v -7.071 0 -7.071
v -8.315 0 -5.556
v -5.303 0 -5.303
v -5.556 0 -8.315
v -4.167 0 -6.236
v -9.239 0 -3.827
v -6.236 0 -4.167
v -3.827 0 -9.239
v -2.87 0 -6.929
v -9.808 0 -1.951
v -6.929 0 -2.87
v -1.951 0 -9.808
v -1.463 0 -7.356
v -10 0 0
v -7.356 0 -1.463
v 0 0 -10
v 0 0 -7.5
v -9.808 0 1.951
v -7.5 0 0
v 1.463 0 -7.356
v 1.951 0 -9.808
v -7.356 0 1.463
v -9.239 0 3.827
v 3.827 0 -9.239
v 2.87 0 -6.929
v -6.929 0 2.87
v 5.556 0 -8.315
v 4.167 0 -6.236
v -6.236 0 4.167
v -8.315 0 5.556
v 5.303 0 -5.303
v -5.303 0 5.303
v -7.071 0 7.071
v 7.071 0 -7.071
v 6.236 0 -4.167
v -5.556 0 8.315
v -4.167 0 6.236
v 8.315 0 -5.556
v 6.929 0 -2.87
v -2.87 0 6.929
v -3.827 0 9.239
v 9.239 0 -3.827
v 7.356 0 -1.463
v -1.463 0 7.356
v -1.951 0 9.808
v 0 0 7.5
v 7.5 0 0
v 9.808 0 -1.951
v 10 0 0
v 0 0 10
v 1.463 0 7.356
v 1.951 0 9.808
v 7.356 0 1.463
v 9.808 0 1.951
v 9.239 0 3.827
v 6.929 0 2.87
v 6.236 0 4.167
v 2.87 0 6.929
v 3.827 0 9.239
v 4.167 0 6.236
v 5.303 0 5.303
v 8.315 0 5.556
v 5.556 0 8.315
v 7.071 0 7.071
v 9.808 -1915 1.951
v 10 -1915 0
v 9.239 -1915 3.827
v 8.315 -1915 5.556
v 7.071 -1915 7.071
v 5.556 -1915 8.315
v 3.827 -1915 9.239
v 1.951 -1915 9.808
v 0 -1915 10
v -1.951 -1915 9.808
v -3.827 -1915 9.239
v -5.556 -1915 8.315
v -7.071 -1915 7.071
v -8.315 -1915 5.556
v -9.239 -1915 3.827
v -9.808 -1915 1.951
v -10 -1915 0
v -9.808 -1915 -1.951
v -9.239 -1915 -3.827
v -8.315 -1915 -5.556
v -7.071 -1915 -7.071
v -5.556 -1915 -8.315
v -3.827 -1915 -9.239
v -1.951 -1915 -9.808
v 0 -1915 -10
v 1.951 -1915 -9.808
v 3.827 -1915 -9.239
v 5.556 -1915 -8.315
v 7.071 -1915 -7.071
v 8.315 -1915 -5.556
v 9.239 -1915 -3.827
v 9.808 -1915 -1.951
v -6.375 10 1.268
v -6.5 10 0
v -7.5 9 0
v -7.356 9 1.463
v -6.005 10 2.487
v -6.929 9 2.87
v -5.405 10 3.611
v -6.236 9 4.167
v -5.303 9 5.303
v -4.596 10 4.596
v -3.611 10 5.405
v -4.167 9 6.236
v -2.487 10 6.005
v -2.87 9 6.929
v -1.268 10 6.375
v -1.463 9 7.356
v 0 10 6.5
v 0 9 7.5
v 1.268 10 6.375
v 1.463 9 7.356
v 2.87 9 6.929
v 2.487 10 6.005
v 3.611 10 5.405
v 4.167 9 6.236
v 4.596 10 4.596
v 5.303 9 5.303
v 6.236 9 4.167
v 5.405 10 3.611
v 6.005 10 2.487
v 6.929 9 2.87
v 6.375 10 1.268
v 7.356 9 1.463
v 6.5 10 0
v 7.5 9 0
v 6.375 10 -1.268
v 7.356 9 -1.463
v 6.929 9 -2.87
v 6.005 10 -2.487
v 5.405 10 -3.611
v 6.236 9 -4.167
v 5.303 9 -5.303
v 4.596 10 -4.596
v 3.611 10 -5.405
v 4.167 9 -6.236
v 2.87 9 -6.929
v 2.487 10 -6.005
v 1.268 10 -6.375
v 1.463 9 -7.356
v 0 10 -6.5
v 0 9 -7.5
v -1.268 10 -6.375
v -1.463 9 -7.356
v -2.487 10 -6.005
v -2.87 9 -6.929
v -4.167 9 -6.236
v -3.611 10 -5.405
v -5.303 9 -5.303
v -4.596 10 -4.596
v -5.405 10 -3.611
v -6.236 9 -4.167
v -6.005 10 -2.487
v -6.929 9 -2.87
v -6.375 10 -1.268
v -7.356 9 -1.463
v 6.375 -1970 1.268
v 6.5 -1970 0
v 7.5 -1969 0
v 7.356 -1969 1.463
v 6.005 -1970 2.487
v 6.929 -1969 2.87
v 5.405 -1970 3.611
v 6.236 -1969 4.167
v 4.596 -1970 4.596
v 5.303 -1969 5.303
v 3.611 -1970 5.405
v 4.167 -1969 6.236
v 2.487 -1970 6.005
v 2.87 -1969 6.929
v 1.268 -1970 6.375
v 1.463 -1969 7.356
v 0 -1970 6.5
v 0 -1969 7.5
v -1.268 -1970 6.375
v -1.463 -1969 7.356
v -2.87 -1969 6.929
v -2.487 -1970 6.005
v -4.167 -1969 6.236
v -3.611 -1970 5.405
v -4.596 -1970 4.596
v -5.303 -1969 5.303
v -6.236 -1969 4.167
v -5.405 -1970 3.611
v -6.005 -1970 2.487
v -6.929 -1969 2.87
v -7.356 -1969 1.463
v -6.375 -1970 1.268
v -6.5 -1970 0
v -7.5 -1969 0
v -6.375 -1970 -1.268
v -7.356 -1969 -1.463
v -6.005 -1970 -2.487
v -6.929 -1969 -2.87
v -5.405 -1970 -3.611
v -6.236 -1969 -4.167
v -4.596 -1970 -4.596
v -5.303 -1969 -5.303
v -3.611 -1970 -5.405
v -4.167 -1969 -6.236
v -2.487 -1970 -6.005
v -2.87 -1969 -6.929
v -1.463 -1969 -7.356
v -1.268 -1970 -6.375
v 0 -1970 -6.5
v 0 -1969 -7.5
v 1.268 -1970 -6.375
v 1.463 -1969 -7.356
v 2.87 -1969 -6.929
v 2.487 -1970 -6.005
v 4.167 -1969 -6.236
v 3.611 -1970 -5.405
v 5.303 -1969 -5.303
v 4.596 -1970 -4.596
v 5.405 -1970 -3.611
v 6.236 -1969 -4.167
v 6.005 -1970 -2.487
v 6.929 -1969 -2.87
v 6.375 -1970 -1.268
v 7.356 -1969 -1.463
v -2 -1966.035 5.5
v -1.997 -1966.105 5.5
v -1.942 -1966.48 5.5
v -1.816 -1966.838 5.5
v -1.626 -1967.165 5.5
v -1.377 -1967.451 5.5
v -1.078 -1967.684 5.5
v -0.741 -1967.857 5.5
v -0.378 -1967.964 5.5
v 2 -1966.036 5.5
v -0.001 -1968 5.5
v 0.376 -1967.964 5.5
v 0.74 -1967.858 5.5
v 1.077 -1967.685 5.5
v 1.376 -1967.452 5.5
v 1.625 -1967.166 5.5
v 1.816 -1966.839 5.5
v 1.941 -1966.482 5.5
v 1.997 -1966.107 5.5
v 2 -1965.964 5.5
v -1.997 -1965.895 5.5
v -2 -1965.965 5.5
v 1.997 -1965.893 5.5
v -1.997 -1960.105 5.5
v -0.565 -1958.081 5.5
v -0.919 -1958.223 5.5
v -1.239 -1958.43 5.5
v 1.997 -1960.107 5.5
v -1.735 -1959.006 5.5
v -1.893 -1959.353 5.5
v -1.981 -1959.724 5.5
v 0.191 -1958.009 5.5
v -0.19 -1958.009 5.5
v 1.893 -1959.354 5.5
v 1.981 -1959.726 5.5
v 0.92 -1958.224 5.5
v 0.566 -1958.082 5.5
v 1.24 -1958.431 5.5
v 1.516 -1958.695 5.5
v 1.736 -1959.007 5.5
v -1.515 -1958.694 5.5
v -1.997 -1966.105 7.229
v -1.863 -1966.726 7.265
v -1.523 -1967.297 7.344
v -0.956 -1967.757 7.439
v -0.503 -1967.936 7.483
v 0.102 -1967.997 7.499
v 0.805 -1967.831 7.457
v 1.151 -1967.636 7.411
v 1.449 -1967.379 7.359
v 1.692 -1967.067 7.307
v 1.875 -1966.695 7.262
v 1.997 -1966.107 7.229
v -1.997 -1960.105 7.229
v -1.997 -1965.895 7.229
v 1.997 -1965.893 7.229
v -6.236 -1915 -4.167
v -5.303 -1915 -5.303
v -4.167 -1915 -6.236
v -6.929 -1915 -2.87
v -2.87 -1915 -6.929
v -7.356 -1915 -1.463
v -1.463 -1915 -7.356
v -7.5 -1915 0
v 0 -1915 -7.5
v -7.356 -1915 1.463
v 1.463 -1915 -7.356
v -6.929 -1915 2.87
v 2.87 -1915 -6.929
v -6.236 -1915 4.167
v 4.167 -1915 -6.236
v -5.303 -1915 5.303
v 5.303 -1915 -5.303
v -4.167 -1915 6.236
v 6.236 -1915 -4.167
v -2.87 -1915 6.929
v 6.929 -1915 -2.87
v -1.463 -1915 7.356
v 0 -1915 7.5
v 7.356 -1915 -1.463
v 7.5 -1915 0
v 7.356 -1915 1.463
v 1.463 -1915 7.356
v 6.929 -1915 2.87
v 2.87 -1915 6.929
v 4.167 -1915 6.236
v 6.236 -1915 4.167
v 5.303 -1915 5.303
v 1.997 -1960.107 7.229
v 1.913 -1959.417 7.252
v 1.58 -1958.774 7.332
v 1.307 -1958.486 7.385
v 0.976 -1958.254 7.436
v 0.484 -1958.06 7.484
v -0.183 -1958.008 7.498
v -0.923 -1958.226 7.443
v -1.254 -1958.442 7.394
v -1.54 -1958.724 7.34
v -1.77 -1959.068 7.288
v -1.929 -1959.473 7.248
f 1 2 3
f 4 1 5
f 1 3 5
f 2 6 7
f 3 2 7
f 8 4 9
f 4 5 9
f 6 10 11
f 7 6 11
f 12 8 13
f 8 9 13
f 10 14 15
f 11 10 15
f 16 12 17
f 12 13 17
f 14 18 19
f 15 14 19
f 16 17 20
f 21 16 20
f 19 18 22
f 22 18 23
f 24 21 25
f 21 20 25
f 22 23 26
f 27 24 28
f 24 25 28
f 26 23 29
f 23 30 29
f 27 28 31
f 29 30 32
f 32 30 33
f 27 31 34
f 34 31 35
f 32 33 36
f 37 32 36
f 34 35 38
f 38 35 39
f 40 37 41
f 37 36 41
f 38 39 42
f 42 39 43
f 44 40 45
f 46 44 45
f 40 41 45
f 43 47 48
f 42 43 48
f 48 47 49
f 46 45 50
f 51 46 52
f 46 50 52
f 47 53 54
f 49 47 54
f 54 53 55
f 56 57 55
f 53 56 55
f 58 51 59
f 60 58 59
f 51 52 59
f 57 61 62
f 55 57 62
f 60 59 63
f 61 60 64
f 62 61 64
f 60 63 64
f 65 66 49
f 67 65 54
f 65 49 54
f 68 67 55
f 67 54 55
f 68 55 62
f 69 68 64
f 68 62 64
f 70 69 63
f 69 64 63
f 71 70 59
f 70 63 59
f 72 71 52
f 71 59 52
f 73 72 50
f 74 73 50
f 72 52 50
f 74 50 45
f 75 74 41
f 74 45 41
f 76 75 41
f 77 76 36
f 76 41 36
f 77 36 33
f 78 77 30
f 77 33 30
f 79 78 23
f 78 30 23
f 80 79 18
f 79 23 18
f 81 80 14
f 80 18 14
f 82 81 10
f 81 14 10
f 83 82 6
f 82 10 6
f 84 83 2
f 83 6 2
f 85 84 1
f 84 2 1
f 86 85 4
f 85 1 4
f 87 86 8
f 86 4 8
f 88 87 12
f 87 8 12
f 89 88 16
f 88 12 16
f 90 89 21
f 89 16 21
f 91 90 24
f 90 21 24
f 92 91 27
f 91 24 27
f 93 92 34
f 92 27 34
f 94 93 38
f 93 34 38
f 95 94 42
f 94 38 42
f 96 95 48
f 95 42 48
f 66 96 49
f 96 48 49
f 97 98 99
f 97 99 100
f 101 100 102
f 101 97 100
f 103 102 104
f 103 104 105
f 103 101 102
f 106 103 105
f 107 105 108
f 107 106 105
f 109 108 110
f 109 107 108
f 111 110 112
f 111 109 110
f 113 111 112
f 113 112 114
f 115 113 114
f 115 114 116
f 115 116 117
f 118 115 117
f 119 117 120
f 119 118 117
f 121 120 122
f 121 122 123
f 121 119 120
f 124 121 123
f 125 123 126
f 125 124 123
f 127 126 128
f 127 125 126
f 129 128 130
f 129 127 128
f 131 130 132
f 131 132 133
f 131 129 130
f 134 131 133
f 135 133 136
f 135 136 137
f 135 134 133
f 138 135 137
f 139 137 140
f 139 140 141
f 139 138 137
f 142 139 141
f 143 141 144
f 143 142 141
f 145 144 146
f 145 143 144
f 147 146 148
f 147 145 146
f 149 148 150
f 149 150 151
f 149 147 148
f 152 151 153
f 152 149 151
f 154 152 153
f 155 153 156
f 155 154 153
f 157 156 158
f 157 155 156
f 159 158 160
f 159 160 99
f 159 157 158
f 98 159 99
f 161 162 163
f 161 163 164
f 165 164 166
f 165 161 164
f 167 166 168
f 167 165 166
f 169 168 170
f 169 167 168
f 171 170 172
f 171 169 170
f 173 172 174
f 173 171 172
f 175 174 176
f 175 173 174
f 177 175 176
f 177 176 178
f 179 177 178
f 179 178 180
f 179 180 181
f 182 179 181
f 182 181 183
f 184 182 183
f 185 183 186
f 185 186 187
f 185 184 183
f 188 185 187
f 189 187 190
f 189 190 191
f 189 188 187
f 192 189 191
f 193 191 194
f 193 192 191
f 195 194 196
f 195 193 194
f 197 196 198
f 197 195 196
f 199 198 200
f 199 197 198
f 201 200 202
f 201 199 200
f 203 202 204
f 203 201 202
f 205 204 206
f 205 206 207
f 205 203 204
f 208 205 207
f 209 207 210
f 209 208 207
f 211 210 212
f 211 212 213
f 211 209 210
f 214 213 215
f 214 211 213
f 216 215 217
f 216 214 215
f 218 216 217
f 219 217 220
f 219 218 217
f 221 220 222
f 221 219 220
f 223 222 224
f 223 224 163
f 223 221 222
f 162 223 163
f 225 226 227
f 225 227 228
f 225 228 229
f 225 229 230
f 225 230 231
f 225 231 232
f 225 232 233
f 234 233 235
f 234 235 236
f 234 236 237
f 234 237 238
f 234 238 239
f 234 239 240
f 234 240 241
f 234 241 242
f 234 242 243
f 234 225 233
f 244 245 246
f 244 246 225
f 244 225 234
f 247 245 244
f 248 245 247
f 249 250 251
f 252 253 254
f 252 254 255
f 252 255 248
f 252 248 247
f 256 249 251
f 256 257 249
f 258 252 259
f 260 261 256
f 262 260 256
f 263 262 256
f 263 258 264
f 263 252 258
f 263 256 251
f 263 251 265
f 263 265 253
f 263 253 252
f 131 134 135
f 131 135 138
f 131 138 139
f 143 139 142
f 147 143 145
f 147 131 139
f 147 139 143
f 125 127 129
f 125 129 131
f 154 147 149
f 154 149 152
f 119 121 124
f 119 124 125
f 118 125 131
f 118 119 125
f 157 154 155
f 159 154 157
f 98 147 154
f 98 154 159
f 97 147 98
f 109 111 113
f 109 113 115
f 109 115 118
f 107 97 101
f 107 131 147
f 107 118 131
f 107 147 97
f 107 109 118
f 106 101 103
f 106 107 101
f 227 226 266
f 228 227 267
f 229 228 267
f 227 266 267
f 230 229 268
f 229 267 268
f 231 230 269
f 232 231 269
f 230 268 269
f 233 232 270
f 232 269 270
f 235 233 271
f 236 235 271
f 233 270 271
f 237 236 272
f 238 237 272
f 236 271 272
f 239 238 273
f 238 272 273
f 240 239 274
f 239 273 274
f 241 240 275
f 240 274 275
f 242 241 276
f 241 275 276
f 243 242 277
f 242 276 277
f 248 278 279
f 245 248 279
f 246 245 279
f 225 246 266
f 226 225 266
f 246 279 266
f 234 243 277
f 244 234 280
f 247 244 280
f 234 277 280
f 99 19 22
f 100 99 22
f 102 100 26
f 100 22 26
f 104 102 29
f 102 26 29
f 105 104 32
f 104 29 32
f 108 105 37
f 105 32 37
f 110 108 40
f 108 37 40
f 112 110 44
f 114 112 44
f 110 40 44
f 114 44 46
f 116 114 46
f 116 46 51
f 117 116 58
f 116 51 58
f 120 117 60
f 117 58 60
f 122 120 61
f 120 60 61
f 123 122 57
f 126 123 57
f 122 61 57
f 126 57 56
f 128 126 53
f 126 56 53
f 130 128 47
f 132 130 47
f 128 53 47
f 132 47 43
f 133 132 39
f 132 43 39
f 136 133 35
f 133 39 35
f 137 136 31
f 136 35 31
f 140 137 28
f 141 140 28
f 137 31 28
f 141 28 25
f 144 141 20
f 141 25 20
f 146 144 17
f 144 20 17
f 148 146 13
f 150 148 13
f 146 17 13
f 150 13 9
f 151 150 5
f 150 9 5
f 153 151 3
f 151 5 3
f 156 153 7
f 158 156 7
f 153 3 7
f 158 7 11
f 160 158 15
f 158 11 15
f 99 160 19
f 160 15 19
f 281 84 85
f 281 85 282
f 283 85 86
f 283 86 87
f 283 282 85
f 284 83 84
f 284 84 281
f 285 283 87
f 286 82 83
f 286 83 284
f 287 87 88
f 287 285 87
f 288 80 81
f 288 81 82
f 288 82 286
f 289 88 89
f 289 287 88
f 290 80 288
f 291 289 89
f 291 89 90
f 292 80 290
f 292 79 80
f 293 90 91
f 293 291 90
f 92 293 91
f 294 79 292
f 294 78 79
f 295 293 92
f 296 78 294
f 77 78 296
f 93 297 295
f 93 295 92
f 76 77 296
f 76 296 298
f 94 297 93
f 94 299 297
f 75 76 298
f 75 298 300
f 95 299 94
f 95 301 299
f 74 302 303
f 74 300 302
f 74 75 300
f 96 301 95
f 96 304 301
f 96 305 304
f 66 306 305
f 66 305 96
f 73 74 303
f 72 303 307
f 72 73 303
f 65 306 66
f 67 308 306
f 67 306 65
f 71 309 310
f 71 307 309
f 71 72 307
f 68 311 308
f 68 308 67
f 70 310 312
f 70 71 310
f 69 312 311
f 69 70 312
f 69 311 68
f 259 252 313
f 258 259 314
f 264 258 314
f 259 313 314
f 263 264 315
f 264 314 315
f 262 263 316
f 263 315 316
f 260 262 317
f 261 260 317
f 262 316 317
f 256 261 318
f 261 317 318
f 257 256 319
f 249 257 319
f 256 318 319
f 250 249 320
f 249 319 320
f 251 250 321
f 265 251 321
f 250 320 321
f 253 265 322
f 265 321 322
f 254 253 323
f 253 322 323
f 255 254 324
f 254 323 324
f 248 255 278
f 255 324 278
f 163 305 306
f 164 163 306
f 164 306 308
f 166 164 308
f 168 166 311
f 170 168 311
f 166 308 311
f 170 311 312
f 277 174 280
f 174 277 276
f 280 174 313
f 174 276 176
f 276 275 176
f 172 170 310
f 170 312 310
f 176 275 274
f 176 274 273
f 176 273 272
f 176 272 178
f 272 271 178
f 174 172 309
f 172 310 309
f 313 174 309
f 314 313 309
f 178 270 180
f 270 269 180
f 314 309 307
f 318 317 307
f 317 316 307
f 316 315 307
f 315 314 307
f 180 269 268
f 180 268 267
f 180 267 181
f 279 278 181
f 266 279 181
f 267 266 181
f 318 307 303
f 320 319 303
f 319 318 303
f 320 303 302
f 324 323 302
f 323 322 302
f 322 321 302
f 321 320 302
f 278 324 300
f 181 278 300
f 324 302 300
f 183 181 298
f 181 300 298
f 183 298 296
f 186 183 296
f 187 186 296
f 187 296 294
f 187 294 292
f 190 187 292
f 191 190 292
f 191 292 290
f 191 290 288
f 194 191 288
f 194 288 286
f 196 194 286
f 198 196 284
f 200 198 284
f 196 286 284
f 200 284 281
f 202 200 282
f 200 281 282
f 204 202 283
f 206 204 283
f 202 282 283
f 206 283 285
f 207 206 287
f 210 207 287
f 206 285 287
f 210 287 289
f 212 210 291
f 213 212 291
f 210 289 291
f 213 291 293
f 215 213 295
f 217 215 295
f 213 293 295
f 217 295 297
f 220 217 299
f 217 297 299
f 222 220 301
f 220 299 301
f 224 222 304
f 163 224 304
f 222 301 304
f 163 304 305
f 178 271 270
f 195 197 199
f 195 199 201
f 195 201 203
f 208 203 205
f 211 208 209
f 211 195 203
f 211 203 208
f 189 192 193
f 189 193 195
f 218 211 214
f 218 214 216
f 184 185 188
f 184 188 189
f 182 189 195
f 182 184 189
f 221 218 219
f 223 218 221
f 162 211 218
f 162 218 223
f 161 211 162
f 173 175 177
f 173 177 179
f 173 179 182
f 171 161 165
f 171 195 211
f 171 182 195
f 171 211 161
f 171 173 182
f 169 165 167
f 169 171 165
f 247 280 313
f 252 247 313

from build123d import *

# Parameters (mm, degrees)
F0_R     = 10
F1_DEPTH = 1915
F2_R     = 7.5
F3_DEPTH = 55
F4_R     = 7.5
F5_DEPTH = 10
F8_DEPTH = 2
F9_SIZE  = 1


with BuildPart() as f1:
    # F0 (on Front) → F1 (new body)
    with BuildSketch(Plane.XZ):
        Circle(F0_R)
    extrude(amount=F1_DEPTH)

    # F2 (on face) → F3 (join)
    with BuildSketch(Plane.XZ.offset(1915)):
        Circle(F2_R)
    extrude(amount=F3_DEPTH)

    # F4 (on face) → F5 (join)
    with BuildSketch(Plane(origin=(0, 0, 0), x_dir=(-1, 0, 0), z_dir=(0, 1, 0))):
        Circle(F4_R)
    extrude(amount=F5_DEPTH)

    # F7 (on offset) → F8 (cut)
    with BuildSketch(Plane.XY.offset(7.5)):
        with BuildLine():
            Line((1.997144, -1965.893146), (1.997144, -1960.106854))
            ThreePointArc((1.997144, -1960.106854), (0.000708, -1958), (-1.997219, -1960.105441))
            Line((-1.997219, -1960.105441), (-1.997219, -1965.894559))
            Line((-1.997219, -1965.894559), (-1.997219, -1966.105441))
            ThreePointArc((-1.997219, -1966.105441), (-0.000708, -1968), (1.997144, -1966.106854))
            Line((1.997144, -1966.106854), (1.997144, -1965.893146))
        make_face()
        with BuildLine():
            ThreePointArc((1.997144, -1966.106854), (2, -1966), (1.997144, -1965.893146))
            Line((1.997144, -1965.893146), (1.997144, -1966.106854))
        make_face()
        with BuildLine():
            Line((-1.997219, -1966.105441), (-1.997219, -1965.894559))
            ThreePointArc((-1.997219, -1965.894559), (-2, -1966), (-1.997219, -1966.105441))
        make_face()
    extrude(amount=-F8_DEPTH, mode=Mode.SUBTRACT)

    # F9
    f9_edges = [f1.edges().sort_by_distance(p)[0] for p in [
        (-7.5, -1970, 0),
        (7.5, 10, 0),
    ]]
    chamfer(f9_edges, length=F9_SIZE)


solid = f1.part
